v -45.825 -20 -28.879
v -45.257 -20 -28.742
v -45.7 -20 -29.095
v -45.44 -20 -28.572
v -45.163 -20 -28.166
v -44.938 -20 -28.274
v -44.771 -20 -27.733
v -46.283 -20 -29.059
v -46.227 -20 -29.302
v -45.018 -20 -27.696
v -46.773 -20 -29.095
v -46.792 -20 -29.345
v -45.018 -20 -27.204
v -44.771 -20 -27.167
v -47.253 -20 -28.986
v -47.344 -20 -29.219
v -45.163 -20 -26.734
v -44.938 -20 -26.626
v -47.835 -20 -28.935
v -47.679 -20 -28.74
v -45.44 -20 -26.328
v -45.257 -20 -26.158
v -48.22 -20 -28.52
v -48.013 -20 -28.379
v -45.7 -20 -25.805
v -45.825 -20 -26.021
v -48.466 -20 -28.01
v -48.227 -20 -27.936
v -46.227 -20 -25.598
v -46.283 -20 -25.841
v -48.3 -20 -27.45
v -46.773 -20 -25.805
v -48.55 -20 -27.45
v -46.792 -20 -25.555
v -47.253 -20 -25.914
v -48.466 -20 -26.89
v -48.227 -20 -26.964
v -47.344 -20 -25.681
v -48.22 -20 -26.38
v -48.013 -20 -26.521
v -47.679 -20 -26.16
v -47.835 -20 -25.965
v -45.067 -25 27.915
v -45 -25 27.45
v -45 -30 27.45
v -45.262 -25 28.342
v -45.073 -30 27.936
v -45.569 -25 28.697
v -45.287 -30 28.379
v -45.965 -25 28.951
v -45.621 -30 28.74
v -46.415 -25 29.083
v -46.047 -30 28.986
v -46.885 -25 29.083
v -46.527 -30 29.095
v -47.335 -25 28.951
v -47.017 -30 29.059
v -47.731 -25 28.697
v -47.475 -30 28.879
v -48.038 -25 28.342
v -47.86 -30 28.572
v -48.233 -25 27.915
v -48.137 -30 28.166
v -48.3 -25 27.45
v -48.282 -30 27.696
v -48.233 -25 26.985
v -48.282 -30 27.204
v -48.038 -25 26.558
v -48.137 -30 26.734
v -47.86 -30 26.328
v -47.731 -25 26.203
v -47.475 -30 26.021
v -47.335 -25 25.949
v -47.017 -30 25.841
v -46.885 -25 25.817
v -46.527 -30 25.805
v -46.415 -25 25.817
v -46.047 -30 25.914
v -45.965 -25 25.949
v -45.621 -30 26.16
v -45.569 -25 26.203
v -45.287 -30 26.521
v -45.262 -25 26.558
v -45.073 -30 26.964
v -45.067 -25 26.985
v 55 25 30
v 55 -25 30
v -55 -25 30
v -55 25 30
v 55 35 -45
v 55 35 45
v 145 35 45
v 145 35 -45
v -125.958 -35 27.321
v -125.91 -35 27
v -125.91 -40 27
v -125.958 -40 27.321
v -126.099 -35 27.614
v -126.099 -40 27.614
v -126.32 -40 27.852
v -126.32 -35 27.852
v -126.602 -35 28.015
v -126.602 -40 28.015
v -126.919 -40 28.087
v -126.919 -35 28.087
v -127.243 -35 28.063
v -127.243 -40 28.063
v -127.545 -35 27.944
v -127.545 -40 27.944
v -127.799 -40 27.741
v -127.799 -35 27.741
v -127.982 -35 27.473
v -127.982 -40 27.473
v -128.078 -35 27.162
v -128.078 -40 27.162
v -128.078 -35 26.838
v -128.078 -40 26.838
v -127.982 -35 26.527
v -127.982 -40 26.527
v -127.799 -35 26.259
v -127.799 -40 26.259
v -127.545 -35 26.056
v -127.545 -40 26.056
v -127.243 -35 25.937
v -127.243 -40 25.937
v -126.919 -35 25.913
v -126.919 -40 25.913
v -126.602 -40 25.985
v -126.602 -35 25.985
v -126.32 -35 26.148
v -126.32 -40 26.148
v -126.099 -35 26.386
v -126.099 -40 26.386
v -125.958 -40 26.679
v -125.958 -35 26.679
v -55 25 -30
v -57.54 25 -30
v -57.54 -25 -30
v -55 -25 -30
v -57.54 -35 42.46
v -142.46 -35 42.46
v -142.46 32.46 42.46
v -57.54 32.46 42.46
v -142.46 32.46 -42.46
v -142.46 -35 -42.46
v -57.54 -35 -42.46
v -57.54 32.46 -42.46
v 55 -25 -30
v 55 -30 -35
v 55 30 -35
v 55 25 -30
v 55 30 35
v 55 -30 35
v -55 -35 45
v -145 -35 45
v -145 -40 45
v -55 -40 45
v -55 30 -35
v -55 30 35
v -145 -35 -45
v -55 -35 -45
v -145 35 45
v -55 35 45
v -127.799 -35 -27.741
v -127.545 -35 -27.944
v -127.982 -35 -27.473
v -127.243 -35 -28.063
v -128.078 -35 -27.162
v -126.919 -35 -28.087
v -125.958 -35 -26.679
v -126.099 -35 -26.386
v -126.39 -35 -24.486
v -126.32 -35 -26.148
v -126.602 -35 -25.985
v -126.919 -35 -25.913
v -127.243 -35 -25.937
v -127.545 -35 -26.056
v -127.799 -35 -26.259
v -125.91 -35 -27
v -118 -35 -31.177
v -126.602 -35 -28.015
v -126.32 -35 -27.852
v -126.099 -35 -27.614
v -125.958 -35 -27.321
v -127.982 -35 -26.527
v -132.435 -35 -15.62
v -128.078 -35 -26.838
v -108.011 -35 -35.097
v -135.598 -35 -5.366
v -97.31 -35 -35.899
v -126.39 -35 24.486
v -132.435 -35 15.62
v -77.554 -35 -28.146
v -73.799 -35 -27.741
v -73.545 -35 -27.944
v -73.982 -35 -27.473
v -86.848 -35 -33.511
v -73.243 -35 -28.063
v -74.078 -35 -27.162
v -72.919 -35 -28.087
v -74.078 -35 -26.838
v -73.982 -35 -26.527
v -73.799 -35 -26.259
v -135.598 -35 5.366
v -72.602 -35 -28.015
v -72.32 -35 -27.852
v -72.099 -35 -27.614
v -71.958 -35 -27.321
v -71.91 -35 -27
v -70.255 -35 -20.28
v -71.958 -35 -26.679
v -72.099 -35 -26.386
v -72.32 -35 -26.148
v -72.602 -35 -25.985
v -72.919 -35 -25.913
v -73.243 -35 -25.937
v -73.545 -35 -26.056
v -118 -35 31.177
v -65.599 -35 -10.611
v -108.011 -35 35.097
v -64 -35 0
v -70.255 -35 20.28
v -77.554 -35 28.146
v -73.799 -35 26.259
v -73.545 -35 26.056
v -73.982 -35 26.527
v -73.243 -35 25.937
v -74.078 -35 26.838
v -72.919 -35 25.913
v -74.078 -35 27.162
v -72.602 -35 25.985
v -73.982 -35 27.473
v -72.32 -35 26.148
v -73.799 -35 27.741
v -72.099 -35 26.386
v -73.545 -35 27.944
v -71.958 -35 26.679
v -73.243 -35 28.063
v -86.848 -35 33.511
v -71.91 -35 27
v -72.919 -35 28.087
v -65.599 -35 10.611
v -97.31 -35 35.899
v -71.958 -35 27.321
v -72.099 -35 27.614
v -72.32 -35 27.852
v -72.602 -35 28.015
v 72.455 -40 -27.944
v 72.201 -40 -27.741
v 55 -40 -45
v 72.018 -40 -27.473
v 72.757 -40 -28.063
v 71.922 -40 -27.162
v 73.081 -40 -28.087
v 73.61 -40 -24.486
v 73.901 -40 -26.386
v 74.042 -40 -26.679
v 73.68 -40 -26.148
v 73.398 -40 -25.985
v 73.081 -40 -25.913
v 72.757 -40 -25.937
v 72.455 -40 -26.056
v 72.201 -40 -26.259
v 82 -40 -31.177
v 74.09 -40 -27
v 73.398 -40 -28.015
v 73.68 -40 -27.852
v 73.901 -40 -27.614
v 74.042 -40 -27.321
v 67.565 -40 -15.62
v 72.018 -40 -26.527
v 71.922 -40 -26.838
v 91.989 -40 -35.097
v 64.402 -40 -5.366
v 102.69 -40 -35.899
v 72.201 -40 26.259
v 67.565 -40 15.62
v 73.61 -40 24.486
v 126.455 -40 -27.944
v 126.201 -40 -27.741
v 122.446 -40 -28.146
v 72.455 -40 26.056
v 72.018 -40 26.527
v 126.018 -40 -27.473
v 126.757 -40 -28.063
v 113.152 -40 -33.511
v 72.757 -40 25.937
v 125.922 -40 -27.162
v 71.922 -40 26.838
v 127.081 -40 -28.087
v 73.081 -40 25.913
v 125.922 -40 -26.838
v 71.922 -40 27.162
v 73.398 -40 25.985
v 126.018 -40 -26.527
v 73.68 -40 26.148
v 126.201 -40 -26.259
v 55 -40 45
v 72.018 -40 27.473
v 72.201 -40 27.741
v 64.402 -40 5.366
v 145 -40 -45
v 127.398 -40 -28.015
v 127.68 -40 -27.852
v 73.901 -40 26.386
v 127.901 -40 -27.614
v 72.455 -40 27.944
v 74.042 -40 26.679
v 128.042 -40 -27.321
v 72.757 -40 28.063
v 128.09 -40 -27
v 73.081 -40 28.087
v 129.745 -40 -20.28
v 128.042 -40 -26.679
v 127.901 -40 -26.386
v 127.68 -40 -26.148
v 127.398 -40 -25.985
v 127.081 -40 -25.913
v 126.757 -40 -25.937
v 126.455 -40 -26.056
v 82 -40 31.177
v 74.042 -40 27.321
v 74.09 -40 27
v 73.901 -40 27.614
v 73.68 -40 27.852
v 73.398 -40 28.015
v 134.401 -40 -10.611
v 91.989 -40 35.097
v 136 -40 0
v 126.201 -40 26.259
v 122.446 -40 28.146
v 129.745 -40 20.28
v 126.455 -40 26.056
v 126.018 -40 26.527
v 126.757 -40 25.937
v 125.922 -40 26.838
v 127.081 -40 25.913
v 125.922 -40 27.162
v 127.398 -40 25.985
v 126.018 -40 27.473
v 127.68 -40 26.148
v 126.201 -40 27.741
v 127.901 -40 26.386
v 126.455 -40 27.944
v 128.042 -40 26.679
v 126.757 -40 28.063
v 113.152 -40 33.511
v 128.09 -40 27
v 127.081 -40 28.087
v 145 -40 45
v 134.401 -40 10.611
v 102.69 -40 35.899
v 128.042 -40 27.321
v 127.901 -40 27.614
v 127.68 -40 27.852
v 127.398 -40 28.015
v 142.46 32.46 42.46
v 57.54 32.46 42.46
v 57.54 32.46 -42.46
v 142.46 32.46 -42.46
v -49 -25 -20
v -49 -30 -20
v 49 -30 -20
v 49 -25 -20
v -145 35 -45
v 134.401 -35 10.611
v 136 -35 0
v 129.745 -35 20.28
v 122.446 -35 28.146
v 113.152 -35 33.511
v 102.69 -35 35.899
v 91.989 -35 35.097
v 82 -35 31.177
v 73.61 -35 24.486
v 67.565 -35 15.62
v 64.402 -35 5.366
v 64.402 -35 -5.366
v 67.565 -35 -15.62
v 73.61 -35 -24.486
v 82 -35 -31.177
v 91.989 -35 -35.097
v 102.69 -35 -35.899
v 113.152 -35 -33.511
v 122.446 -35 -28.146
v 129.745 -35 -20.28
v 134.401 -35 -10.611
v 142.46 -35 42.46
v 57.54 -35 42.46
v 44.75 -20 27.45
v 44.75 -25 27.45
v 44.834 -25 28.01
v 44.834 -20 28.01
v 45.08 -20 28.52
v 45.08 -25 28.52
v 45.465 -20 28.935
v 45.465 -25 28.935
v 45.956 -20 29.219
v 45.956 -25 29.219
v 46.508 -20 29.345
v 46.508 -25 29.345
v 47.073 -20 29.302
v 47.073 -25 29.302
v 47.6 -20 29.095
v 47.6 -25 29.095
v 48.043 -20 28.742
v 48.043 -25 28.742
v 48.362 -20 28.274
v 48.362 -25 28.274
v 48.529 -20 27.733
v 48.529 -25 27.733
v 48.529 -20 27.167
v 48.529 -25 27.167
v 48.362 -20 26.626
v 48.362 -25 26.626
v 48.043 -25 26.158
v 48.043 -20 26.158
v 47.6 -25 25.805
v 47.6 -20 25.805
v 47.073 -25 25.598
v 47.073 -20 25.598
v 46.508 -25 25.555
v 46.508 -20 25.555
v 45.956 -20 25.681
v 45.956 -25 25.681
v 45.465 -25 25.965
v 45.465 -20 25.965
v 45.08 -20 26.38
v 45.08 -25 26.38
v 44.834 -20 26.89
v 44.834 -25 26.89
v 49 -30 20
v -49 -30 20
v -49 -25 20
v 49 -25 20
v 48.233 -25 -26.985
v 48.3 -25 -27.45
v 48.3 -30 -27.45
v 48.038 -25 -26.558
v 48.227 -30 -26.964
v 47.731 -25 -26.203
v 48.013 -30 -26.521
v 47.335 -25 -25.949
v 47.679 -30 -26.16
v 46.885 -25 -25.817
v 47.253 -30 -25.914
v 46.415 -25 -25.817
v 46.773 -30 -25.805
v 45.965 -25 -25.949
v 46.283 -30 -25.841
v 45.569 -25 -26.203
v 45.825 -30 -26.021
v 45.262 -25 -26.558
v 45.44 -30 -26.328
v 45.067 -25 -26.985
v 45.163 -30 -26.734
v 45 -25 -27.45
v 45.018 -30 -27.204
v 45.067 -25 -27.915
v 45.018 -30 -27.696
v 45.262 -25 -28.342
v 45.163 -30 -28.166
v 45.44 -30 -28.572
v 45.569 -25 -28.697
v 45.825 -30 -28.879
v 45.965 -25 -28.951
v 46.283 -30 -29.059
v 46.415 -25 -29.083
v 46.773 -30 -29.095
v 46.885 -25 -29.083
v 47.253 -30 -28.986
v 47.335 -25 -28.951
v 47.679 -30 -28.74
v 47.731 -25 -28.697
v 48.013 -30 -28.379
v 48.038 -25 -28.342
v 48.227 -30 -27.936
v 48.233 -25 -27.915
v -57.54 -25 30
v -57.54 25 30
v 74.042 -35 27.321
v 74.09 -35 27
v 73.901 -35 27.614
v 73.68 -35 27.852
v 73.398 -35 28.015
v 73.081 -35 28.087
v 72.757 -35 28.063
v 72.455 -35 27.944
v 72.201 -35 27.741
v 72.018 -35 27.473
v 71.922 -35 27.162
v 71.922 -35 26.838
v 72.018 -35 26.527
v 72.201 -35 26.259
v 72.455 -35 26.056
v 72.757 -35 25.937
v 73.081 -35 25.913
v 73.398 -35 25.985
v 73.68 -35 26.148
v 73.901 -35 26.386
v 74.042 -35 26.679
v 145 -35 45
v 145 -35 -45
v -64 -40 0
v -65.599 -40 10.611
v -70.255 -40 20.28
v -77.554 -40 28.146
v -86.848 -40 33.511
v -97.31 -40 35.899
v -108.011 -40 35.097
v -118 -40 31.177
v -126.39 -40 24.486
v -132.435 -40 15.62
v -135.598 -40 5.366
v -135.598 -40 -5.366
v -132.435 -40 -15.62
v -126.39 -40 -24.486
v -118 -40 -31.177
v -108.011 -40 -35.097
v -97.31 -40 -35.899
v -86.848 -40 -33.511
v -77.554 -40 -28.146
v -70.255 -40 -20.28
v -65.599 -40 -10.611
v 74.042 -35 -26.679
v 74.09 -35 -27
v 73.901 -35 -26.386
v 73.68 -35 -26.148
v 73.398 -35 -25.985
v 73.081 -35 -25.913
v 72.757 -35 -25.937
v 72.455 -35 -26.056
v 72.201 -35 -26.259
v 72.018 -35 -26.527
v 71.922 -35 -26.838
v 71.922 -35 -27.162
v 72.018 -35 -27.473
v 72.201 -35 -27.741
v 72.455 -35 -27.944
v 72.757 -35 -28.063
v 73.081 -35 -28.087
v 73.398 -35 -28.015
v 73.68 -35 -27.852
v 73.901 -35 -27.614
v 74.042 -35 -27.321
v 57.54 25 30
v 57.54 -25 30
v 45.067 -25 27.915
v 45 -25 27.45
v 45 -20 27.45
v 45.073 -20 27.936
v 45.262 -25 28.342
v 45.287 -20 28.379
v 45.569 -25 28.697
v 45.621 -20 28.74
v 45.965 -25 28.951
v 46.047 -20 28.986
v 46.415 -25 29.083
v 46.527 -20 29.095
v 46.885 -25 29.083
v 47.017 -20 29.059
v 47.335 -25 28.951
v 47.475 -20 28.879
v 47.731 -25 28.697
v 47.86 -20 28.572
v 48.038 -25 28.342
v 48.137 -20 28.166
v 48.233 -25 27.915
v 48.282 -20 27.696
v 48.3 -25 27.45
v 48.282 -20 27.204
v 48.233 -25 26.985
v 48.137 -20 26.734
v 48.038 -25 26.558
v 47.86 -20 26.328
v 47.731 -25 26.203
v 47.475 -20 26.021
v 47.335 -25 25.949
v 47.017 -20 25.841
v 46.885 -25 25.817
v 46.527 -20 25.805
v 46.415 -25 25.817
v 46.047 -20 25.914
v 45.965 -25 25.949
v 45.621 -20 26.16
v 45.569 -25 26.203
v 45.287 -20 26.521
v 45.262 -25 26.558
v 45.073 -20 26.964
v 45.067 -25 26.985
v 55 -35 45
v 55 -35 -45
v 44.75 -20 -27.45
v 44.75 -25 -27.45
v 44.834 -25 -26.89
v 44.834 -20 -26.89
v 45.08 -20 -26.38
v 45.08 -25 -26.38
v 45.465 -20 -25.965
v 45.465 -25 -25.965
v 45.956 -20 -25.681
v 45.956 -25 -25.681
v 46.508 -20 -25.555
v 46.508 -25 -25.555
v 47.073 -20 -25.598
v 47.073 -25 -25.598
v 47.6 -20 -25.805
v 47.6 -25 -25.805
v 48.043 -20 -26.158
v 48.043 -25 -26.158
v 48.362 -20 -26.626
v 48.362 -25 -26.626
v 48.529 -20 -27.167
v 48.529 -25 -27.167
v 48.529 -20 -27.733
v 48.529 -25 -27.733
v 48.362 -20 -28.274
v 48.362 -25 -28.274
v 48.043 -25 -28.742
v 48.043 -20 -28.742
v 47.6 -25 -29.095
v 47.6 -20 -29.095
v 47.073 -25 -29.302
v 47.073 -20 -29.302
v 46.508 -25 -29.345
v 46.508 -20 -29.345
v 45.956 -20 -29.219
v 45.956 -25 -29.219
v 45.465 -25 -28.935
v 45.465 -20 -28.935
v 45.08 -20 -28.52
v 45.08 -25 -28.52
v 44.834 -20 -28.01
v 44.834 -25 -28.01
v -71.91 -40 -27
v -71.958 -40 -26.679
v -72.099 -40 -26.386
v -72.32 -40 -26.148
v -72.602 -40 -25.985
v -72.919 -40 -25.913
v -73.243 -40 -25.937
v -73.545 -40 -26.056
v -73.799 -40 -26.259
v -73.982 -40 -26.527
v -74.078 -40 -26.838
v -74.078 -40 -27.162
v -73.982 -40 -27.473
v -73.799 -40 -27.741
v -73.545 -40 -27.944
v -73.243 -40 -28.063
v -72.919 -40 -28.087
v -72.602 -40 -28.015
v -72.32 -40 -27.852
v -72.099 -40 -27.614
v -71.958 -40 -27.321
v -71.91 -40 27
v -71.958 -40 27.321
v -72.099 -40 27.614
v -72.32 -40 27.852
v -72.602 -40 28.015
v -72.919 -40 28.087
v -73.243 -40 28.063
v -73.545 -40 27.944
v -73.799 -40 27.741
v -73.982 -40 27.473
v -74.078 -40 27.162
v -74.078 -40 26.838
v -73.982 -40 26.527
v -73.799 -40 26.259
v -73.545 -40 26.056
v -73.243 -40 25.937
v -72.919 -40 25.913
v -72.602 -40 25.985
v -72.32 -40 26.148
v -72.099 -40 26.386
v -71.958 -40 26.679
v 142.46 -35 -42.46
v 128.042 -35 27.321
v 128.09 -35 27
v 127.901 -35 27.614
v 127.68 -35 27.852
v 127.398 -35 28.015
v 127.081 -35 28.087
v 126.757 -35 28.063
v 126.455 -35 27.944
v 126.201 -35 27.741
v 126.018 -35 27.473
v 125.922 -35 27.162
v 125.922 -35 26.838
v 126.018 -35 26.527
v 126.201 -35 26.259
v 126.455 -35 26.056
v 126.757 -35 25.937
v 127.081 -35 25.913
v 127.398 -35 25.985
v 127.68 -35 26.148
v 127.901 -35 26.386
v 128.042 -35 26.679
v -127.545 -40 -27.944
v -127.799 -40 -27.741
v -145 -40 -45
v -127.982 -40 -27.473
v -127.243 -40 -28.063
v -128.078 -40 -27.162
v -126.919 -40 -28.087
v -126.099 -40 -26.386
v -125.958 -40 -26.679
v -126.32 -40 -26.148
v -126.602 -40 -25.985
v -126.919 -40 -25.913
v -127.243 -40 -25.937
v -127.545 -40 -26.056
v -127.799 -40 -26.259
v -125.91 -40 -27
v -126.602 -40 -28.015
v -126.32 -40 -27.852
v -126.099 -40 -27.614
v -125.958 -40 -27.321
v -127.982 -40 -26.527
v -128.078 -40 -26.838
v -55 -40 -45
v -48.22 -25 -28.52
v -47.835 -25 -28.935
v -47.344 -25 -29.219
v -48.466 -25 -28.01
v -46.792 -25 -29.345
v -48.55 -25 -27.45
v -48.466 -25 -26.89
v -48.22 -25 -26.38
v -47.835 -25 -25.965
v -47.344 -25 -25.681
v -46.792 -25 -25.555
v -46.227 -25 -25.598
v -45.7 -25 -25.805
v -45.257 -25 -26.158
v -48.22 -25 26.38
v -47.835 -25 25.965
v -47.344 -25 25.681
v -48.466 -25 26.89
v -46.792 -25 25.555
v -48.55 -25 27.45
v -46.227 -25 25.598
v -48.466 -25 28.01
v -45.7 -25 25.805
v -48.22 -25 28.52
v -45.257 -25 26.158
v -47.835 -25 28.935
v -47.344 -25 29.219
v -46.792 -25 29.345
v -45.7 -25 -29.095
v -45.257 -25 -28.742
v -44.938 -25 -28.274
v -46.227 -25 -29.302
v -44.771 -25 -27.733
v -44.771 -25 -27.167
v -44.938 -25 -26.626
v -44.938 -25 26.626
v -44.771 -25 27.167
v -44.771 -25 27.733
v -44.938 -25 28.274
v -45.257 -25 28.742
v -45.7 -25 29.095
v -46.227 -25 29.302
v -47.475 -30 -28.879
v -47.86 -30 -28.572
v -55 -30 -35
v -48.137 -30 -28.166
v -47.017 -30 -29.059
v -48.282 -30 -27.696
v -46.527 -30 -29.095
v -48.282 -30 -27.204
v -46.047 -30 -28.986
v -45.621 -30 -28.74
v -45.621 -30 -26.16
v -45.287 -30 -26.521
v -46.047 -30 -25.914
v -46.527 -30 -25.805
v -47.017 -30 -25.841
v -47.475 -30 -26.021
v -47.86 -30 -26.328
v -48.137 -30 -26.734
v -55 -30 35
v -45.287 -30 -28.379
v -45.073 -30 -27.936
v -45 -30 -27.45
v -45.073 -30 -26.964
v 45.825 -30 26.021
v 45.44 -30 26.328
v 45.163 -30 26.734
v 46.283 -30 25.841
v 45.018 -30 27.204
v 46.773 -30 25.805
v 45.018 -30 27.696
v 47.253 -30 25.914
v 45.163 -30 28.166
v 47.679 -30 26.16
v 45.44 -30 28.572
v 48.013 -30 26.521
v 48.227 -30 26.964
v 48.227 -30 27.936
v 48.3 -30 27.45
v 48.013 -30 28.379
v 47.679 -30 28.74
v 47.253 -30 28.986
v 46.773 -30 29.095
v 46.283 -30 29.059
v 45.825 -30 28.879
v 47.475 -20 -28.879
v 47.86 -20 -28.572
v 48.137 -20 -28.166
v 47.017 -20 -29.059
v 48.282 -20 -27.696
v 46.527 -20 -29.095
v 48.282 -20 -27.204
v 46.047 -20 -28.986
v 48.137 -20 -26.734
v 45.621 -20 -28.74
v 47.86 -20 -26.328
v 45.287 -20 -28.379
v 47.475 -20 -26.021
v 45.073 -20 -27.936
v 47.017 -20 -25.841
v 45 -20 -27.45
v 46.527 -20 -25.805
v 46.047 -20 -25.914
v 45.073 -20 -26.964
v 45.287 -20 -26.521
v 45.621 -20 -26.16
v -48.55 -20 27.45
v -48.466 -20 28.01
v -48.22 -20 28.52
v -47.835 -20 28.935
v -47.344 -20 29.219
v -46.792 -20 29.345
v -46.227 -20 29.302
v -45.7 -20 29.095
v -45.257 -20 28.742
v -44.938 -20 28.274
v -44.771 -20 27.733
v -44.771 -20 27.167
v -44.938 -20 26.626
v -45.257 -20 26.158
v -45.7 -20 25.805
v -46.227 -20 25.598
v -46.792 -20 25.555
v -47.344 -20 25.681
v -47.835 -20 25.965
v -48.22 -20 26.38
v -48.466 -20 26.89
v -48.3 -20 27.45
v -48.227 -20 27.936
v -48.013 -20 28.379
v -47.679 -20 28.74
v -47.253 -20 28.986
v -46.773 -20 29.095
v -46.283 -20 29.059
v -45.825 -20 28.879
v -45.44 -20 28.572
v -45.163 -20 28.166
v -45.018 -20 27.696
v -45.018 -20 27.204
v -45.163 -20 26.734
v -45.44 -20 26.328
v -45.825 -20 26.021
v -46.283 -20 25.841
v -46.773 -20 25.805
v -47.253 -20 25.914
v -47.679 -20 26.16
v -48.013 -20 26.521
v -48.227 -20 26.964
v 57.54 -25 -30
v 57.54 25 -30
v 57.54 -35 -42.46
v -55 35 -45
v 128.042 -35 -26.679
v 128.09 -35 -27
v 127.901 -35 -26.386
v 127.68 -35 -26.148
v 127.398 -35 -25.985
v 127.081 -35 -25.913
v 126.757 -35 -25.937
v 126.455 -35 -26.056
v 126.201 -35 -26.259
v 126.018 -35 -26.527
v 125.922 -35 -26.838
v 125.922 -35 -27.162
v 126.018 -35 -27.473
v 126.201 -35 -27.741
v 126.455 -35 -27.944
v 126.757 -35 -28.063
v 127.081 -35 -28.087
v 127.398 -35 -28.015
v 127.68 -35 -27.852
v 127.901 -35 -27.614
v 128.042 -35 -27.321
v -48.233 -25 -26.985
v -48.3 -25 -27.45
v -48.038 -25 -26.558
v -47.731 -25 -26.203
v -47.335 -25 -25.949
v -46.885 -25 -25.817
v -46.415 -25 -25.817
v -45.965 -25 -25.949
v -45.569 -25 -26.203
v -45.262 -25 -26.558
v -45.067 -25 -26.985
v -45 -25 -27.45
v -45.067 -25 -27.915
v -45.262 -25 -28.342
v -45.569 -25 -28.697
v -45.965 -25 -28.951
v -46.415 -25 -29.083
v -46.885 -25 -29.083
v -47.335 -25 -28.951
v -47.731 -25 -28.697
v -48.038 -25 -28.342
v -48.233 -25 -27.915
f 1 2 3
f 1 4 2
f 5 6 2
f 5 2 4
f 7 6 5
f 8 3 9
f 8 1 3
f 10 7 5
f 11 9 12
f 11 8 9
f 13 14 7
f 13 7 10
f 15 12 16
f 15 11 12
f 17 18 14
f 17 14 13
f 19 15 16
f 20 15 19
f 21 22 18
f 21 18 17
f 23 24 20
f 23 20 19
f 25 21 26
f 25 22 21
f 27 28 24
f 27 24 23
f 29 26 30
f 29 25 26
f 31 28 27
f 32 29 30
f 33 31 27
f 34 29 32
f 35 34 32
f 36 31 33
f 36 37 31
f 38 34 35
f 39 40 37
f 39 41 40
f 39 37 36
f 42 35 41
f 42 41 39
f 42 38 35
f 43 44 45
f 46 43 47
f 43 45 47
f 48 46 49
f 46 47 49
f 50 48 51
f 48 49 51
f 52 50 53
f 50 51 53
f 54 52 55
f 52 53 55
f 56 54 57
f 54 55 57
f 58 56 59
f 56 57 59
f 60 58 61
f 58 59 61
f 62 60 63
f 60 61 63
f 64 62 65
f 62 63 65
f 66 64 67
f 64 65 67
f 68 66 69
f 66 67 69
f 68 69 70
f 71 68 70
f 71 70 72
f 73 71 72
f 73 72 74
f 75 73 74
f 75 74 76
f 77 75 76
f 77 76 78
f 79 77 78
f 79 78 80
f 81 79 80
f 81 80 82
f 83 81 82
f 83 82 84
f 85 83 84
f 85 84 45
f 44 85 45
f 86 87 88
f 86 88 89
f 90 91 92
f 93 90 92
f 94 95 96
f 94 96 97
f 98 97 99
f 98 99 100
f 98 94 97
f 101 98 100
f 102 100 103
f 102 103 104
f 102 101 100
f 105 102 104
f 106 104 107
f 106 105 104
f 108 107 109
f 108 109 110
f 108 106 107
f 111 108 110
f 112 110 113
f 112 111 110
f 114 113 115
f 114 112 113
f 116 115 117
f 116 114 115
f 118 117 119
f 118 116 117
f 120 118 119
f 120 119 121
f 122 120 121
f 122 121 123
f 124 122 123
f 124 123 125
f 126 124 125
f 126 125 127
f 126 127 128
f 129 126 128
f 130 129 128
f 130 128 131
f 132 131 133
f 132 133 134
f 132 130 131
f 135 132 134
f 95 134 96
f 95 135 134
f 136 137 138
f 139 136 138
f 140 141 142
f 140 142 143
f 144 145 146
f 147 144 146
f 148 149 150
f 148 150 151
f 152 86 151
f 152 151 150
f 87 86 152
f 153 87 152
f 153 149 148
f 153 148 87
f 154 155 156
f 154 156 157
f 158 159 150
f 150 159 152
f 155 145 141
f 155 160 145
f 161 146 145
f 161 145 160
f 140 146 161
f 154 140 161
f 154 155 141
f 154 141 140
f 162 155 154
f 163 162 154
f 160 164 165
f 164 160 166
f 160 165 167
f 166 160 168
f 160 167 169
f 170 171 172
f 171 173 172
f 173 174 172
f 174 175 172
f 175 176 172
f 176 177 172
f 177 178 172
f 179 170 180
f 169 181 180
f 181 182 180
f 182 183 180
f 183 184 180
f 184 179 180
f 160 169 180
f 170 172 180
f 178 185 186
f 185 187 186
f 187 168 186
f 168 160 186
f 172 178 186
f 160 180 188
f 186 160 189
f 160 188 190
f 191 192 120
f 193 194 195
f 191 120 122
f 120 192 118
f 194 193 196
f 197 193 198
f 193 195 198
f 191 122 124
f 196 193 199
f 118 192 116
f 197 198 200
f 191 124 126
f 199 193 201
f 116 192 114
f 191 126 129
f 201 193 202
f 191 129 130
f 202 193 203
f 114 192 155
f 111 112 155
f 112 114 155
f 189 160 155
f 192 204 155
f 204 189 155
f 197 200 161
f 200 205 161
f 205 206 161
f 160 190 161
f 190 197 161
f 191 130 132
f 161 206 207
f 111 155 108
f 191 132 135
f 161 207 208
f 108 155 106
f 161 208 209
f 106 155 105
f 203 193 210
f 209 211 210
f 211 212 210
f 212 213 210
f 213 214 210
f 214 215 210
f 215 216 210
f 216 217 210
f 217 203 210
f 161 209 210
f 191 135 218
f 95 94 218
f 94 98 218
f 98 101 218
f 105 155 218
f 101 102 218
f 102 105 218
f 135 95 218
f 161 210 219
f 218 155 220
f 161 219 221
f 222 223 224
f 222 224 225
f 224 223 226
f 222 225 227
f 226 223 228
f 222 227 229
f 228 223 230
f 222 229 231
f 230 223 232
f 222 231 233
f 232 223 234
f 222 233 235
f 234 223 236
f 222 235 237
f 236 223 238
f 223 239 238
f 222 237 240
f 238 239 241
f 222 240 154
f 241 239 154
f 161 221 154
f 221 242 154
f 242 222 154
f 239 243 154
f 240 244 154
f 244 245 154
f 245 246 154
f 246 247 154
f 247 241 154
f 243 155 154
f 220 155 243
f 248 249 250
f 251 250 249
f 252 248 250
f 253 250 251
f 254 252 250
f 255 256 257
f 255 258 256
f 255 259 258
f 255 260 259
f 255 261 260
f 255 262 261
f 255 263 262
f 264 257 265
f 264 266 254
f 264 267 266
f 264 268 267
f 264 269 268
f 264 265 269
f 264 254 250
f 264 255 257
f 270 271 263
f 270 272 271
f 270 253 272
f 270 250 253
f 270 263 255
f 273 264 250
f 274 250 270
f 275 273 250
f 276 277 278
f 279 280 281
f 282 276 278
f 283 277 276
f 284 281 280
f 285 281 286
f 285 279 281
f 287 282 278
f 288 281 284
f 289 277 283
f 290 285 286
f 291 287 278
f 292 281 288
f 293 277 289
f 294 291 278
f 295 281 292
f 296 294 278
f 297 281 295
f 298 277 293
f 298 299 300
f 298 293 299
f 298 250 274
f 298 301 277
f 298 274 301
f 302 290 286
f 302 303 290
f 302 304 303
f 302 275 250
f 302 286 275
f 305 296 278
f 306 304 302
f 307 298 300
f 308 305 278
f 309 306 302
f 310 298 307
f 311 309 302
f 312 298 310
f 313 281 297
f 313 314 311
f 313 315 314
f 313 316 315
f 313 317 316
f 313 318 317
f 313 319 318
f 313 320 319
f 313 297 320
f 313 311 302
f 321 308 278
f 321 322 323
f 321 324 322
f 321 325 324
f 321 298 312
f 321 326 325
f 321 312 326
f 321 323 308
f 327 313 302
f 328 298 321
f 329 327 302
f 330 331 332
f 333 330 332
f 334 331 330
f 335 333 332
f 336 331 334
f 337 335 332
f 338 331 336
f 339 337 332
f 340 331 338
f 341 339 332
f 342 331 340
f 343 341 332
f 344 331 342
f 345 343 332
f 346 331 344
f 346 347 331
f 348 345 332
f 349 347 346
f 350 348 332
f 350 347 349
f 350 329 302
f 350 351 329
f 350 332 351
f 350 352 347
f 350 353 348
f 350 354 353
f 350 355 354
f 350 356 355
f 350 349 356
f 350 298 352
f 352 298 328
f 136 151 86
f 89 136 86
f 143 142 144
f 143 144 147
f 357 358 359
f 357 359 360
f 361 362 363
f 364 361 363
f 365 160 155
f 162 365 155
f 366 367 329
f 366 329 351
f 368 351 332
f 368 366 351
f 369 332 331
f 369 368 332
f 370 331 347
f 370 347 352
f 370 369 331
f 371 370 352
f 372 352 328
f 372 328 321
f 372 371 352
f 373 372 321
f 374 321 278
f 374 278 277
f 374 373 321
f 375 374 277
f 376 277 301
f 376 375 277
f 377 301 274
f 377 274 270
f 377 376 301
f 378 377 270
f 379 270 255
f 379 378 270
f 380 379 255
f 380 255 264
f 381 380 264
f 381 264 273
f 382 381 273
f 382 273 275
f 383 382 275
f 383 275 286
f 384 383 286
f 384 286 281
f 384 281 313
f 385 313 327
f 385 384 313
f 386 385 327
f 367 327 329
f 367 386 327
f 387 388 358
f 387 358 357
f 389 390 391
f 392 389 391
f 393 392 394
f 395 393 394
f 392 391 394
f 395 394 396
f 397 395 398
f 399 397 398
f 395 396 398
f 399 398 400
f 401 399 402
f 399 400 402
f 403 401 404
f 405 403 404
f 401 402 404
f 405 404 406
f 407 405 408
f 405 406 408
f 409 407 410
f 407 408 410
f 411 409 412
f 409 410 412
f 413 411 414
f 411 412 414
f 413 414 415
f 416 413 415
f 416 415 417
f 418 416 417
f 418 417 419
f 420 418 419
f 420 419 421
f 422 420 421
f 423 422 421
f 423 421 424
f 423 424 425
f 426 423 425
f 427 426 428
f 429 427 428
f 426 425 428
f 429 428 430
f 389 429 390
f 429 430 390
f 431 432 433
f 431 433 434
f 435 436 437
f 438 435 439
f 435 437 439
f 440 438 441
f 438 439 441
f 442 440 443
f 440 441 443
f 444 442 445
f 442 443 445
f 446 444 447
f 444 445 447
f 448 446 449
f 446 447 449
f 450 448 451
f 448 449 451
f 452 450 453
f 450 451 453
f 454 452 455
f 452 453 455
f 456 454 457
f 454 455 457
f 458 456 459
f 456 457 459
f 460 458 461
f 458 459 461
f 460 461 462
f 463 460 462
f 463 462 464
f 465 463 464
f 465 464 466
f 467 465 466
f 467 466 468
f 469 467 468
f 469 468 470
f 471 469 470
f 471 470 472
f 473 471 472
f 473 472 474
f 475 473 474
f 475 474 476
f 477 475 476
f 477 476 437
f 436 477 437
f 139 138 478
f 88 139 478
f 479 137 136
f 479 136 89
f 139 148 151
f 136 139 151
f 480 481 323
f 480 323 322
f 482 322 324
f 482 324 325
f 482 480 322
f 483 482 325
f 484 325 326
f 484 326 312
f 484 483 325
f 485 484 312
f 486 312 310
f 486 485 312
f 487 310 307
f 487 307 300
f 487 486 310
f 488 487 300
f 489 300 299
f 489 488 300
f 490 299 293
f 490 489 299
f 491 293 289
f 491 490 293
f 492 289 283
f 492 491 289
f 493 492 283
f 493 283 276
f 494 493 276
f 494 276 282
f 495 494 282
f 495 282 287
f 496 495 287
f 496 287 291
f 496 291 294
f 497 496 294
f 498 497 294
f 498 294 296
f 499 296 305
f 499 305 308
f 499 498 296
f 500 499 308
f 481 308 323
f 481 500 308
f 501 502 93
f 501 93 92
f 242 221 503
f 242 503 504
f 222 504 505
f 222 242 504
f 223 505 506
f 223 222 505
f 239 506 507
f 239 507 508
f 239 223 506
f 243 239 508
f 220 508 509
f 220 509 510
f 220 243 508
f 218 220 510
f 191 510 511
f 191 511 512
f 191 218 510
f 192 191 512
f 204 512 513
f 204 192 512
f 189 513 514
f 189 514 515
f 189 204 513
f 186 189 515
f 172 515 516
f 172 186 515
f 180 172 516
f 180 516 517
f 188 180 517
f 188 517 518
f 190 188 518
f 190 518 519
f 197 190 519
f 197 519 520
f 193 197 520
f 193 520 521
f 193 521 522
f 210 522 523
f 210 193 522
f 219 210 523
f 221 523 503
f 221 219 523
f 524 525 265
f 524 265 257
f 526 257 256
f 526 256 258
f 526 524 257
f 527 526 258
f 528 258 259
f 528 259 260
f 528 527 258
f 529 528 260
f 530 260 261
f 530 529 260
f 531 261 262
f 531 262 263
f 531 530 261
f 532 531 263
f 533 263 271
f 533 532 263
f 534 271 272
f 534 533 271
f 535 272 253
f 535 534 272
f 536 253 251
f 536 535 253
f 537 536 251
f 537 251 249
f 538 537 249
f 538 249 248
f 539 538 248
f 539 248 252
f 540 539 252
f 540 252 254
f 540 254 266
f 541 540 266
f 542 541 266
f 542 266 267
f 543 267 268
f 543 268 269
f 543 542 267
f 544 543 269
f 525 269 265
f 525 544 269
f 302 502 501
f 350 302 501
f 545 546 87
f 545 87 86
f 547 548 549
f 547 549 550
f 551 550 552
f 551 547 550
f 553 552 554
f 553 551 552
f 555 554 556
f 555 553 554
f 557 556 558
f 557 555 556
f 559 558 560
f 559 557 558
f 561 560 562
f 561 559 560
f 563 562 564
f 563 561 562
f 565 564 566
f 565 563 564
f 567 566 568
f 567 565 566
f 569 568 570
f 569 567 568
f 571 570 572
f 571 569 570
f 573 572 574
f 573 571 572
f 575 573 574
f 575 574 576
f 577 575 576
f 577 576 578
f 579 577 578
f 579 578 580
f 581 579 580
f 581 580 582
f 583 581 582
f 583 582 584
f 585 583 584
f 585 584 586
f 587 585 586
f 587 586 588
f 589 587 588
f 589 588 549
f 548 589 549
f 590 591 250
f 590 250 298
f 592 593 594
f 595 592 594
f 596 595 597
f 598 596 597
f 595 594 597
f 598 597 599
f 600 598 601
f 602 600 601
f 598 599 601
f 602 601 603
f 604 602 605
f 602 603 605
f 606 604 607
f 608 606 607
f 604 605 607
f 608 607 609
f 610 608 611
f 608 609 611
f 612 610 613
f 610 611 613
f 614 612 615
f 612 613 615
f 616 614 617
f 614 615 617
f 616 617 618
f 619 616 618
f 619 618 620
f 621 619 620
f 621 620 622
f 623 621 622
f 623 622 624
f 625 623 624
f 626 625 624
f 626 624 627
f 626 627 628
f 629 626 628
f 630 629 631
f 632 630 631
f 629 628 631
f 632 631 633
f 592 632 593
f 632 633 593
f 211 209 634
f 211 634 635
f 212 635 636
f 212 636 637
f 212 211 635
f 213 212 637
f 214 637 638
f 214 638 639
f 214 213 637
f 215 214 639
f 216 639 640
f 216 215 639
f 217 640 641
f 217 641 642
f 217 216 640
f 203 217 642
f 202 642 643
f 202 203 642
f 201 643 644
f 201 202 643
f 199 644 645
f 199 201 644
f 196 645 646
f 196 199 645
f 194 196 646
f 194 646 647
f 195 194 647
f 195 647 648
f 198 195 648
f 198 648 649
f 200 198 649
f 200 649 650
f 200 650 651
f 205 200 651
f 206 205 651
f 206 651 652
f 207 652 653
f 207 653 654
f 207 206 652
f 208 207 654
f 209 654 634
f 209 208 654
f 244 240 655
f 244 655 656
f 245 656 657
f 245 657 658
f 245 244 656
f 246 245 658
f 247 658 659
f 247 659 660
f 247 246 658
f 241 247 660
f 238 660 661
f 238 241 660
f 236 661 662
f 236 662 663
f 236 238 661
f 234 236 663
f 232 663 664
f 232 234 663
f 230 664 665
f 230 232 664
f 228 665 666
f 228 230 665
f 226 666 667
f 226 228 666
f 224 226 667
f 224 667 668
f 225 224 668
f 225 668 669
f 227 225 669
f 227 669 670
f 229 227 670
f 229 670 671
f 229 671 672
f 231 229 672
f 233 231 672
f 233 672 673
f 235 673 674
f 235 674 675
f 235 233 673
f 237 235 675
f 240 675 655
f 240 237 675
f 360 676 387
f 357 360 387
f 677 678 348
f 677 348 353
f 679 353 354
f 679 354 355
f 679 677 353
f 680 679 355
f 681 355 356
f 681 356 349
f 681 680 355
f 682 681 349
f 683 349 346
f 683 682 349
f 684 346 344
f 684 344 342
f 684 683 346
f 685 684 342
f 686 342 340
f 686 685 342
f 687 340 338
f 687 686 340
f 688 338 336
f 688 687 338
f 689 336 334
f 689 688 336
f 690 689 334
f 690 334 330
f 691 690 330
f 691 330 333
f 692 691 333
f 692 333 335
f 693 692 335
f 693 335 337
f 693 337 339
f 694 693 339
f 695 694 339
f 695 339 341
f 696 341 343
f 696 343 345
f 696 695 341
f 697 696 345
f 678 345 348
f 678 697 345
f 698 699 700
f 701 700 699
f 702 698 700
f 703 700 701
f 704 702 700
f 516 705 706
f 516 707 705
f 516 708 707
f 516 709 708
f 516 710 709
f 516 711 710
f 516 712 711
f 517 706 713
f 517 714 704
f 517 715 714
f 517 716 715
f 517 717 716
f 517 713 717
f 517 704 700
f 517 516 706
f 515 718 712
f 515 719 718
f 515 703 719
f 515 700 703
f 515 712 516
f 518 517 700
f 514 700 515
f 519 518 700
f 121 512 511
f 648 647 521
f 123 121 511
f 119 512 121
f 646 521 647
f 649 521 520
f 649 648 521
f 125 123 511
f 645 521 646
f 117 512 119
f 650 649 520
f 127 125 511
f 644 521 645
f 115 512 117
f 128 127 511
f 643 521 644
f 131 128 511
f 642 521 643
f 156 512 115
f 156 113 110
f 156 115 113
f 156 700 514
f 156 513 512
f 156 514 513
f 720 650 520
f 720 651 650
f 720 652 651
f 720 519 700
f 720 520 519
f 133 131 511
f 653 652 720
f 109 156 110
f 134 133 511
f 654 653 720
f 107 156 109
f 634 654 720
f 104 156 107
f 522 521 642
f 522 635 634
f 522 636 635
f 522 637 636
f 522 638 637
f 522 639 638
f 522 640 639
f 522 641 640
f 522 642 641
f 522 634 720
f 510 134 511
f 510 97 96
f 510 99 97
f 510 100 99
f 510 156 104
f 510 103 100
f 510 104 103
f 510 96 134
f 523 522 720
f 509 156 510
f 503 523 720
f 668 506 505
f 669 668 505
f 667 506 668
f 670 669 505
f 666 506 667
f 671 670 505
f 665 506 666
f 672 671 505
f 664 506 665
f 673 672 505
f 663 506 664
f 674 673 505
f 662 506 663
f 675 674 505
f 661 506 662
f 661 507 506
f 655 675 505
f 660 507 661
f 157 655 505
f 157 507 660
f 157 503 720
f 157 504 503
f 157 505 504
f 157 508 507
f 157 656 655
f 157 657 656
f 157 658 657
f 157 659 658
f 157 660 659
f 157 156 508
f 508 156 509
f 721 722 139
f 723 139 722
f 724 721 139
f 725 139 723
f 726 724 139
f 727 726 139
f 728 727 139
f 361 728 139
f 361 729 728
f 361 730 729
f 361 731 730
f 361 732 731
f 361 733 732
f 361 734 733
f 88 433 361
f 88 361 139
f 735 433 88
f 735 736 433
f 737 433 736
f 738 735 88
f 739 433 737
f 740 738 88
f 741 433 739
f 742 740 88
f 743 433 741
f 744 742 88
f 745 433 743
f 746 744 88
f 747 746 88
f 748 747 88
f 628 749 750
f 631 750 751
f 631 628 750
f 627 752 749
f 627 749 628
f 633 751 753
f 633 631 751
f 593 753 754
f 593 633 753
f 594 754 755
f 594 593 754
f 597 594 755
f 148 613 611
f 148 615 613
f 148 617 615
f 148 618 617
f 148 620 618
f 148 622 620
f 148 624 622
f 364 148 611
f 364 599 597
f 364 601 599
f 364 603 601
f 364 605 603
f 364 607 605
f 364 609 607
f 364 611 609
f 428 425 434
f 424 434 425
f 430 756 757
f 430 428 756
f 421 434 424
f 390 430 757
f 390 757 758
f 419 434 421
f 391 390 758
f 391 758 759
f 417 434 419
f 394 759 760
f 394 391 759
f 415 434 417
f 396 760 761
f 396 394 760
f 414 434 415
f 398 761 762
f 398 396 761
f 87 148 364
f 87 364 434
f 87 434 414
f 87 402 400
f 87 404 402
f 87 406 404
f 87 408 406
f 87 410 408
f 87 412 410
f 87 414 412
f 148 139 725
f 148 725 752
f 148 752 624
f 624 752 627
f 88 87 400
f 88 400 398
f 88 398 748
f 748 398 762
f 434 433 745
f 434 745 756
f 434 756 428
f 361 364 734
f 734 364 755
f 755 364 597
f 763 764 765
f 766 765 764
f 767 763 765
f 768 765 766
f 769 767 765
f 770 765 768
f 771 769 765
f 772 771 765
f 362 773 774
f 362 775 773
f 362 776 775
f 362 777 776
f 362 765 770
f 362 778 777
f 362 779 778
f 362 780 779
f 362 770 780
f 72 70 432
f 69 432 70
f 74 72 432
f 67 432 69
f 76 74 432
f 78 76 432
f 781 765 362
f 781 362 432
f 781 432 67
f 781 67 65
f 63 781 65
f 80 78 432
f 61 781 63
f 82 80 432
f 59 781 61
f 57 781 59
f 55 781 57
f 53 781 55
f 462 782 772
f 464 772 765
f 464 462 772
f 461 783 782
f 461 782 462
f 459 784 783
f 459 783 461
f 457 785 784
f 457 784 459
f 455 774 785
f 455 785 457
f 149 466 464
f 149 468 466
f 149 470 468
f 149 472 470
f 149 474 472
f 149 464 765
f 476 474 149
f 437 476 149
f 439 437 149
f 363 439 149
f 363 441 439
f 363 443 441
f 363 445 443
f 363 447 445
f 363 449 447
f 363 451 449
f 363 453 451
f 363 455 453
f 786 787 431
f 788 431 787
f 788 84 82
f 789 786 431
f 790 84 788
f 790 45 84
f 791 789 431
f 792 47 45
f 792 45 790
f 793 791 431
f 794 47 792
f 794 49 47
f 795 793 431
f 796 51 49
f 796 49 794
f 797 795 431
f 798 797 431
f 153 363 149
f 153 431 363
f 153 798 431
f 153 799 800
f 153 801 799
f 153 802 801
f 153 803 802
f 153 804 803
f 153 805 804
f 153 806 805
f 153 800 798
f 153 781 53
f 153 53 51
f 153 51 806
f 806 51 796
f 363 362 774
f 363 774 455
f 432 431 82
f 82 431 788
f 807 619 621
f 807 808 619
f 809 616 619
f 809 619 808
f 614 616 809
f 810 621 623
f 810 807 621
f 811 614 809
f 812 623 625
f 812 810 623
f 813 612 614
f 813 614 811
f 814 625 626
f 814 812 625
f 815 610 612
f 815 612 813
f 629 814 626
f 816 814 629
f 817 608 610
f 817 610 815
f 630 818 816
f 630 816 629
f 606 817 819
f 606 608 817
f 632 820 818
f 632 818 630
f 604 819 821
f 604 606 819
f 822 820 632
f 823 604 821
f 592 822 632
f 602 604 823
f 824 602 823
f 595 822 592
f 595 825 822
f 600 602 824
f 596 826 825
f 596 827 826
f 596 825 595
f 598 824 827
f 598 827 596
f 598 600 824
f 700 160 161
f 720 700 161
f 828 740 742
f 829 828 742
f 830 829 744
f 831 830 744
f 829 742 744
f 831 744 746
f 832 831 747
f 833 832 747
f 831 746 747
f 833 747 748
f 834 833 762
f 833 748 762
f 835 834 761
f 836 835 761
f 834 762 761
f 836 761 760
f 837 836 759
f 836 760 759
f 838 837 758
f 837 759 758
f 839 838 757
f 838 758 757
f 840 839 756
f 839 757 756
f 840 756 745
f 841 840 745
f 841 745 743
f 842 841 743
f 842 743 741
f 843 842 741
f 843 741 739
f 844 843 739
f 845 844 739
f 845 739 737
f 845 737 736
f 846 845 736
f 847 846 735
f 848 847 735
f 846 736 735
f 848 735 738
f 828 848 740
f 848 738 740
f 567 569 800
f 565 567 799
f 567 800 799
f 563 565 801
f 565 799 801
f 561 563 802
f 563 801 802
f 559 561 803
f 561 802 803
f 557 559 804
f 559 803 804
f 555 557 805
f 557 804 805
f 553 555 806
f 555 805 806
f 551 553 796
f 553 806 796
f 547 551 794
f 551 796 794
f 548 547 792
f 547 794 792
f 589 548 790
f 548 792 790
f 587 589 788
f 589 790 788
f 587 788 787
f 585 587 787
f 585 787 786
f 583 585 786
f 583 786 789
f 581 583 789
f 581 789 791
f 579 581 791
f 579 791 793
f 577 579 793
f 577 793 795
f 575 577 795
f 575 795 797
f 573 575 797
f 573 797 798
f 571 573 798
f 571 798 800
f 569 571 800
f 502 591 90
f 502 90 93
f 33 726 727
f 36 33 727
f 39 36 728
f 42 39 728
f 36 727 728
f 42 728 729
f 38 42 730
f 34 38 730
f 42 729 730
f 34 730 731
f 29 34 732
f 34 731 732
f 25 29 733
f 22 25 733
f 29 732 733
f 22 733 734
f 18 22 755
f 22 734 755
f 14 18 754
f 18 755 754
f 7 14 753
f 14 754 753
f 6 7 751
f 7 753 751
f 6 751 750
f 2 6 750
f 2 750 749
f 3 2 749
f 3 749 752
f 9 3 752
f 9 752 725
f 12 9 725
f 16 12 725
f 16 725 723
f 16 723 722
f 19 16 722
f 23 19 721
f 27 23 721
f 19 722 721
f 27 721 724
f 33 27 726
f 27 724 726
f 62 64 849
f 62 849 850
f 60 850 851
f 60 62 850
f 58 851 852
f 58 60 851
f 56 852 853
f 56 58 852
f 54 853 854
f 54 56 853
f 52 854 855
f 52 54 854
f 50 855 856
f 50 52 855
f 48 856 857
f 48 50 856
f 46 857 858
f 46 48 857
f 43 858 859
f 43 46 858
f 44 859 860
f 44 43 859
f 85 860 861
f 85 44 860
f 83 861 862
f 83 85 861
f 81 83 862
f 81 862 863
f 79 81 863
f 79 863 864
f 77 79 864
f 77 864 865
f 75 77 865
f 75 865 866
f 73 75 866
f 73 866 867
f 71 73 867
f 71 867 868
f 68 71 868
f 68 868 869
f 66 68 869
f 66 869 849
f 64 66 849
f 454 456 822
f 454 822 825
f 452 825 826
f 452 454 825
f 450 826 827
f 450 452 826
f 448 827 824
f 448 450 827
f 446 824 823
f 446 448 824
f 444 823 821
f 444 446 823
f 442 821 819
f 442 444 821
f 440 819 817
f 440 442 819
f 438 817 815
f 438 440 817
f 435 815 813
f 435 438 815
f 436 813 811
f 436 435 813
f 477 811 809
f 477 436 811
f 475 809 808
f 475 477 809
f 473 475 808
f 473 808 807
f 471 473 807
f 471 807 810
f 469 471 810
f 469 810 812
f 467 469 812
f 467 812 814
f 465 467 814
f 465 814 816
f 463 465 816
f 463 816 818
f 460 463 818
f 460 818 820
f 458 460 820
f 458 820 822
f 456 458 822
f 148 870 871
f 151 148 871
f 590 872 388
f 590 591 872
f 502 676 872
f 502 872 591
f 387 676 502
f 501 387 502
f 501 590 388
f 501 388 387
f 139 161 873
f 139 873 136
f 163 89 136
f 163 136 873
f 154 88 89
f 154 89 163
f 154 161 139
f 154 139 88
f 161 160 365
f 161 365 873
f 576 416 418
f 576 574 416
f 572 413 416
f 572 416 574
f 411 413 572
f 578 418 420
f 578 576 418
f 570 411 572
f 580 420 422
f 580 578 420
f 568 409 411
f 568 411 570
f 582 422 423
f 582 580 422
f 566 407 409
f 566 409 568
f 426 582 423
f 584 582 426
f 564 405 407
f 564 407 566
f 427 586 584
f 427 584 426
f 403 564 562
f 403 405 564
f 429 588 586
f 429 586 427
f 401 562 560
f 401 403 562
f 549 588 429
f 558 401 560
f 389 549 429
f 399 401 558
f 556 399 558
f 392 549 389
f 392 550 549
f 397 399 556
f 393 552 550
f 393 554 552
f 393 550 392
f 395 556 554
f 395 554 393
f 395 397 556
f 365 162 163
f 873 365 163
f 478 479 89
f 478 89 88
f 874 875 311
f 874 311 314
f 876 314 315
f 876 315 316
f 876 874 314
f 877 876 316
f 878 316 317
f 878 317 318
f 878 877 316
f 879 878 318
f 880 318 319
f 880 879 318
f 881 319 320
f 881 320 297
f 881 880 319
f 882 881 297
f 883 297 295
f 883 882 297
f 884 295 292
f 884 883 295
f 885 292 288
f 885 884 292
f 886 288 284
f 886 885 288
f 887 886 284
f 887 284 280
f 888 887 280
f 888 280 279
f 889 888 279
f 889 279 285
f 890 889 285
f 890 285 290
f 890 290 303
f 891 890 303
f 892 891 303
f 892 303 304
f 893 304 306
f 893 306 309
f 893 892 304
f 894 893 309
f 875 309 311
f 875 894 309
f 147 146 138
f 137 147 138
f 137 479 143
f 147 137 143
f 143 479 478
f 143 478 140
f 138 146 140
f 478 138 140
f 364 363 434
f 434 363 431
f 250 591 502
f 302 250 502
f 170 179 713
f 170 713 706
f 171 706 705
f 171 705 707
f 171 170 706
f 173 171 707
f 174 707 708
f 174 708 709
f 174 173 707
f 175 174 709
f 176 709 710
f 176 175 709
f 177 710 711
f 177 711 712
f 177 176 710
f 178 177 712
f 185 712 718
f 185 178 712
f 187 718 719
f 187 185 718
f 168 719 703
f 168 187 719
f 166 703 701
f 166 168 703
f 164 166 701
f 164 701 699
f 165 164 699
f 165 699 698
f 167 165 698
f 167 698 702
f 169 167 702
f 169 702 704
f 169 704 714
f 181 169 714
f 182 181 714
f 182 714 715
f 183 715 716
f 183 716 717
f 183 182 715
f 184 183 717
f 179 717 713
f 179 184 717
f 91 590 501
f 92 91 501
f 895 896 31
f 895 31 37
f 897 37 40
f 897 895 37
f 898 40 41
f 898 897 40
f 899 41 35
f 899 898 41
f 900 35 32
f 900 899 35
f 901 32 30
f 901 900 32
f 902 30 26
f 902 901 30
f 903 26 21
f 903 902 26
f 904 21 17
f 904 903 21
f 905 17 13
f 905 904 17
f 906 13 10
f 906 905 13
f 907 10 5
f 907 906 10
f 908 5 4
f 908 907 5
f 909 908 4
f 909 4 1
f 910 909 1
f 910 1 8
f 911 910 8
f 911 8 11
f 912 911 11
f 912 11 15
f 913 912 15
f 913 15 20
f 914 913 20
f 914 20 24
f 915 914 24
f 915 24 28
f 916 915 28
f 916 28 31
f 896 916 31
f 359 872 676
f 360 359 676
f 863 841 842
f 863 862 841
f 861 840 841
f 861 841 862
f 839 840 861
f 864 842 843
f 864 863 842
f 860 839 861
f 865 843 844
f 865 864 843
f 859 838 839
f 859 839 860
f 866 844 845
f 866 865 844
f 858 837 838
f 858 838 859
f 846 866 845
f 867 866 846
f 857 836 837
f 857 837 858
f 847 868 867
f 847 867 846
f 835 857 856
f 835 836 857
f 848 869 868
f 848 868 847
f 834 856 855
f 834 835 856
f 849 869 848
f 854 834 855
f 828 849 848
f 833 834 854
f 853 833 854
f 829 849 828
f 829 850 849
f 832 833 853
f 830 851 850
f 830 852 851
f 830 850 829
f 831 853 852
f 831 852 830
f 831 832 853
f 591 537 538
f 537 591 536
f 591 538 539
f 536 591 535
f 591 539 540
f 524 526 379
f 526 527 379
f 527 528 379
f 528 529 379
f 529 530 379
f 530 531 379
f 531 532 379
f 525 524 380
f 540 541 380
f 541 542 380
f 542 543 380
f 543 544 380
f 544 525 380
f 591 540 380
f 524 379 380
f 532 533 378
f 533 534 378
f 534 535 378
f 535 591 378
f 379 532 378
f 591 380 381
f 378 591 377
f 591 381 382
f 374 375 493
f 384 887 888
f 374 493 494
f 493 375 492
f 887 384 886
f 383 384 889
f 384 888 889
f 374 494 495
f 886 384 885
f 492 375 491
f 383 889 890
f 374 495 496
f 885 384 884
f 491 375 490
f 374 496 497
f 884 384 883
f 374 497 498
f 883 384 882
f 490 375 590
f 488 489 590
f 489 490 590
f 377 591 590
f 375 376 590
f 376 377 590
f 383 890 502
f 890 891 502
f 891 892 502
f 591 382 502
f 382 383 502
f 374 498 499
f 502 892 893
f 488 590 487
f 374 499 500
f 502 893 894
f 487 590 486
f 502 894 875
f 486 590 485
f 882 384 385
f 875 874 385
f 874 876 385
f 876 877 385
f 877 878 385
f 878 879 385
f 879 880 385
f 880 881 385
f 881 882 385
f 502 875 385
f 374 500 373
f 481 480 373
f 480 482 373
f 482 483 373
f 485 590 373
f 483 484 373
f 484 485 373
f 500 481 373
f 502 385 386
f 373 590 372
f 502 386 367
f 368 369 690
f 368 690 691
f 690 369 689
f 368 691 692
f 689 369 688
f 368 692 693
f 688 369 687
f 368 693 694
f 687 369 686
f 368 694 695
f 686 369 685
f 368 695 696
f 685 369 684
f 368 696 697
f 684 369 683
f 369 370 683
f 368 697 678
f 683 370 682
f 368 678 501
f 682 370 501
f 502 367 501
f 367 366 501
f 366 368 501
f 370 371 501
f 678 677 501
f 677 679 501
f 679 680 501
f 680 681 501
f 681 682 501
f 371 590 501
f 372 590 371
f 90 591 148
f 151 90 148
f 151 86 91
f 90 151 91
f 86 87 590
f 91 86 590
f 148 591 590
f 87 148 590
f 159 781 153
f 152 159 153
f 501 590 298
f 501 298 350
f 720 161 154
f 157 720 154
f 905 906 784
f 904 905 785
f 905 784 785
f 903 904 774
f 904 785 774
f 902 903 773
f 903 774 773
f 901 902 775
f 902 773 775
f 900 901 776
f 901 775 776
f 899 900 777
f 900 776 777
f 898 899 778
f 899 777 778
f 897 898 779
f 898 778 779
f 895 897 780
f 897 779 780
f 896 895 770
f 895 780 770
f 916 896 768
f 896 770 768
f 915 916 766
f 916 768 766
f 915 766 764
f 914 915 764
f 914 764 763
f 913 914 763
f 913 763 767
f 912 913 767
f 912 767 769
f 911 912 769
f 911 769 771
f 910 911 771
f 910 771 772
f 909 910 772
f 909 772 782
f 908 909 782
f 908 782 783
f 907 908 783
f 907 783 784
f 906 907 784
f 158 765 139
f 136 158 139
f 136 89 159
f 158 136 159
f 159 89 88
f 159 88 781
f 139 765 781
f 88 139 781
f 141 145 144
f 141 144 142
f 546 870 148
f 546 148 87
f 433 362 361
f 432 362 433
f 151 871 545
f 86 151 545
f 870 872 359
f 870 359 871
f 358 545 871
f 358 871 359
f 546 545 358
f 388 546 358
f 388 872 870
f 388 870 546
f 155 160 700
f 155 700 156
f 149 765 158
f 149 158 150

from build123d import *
from build123d import SkipClean  # not in build123d's __all__

# Parameters (mm, degrees)
F1_W      = 110
F1_H      = 70
F2_DEPTH  = 60
F4_W      = 90
F4_H      = 90
F4_R      = 1.09
F4_R_2    = 36
F5_DEPTH  = 5
F6_W      = 90
F6_H      = 90
F7_DEPTH  = 70
F8_T      = -2.54
F8_2_T    = -2.54
F9_W      = 50
F9_H      = 60
F10_DEPTH = 110
F11_W     = 50
F11_H     = 60
F12_DEPTH = 25.4
F13_W     = 50
F13_H     = 60
F14_DEPTH = 25.4
F15_W     = 98
F15_H     = 40
F15_R     = 1.65
F16_DEPTH = 25.4
F17_R     = 1.9
F17_R_2   = 1.65
F18_DEPTH = 5


# Not quite as in the source:
# - a feature names something its author has since deleted; it is built from what else it names


with BuildPart() as f2:
    # F1 (on offset) → F2 (new body)
    with BuildSketch(Plane.XZ.offset(30)):
        Rectangle(F1_W, F1_H)
    extrude(amount=-F2_DEPTH)

    # F9 (on face) → F10 (cut, through all)
    with BuildSketch(Plane.YZ.offset(55)):
        Rectangle(F9_W, F9_H)
    extrude(amount=-F10_DEPTH, mode=Mode.SUBTRACT)

    # F15 (on offset) → F16 (cut)
    with BuildSketch(Plane.XZ.offset(30)):
        Rectangle(F15_W, F15_H)
        with Locations((46.65, 27.45)):
            Circle(F15_R)
        with Locations((-46.65, 27.45)):
            Circle(F15_R)
        with Locations((-46.65, -27.45)):
            Circle(F15_R)
        with Locations((46.65, -27.45)):
            Circle(F15_R)
    extrude(amount=-F16_DEPTH, mode=Mode.SUBTRACT)

    # F17 (on face) → F18 (join)
    with BuildSketch(Plane(origin=(0, -25, 0), x_dir=(-1, 0, 0), z_dir=(0, 1, 0))):
        with Locations((-46.65, 27.45)):
            Circle(F17_R)
        with Locations((-46.65, 27.45)):
            Circle(F17_R_2, mode=Mode.SUBTRACT)
        with Locations((46.65, 27.45)):
            Circle(F17_R)
        with Locations((46.65, 27.45)):
            Circle(F17_R_2, mode=Mode.SUBTRACT)
        with Locations((46.65, -27.45)):
            Circle(F17_R)
        with Locations((46.65, -27.45)):
            Circle(F17_R_2, mode=Mode.SUBTRACT)
        with Locations((-46.65, -27.45)):
            Circle(F17_R)
        with Locations((-46.65, -27.45)):
            Circle(F17_R_2, mode=Mode.SUBTRACT)
    with SkipClean():  # cleaning this boolean's faces spoils the solid; the shape is the same uncleaned
        extrude(amount=F18_DEPTH)


with BuildPart() as f5:
    # F4 (on offset) → F5 (new body)
    with BuildSketch(Plane.XZ.offset(35)):
        with Locations((-100, 0)):
            Rectangle(F4_W, F4_H)
        with Locations((-127, -27)):
            Circle(F4_R, mode=Mode.SUBTRACT)
        with Locations((-73, -27)):
            Circle(F4_R, mode=Mode.SUBTRACT)
        with Locations((-100, 0)):
            Circle(F4_R_2, mode=Mode.SUBTRACT)
        with Locations((-127, 27)):
            Circle(F4_R, mode=Mode.SUBTRACT)
        with Locations((-73, 27)):
            Circle(F4_R, mode=Mode.SUBTRACT)
    extrude(amount=F5_DEPTH)


with BuildPart() as f5b:
    # F4 (on offset) → F5, piece 2 (new body)
    with BuildSketch(Plane.XZ.offset(35)):
        with Locations((100, 0)):
            Rectangle(F4_W, F4_H)
        with Locations((73, -27)):
            Circle(F4_R, mode=Mode.SUBTRACT)
        with Locations((127, -27)):
            Circle(F4_R, mode=Mode.SUBTRACT)
        with Locations((100, 0)):
            Circle(F4_R_2, mode=Mode.SUBTRACT)
        with Locations((73, 27)):
            Circle(F4_R, mode=Mode.SUBTRACT)
        with Locations((127, 27)):
            Circle(F4_R, mode=Mode.SUBTRACT)
    extrude(amount=F5_DEPTH)


with BuildPart() as f7:
    # F6 (on offset) → F7 (new body)
    with BuildSketch(Plane.XZ.offset(35)):
        with Locations((-100, 0)):
            Rectangle(F6_W, F6_H)
    extrude(amount=-F7_DEPTH)

    # F8
    f8_openings = [f7.faces().sort_by_distance(p)[0] for p in [
        (-100, -35, 0),
    ]]
    offset(amount=F8_T, openings=f8_openings)

    # F13 (on face) → F14 (cut)
    with BuildSketch(Plane(origin=(-57.54, 0, 0), x_dir=(0, -1, 0), z_dir=(-1, 0, 0))):
        Rectangle(F13_W, F13_H)
    extrude(amount=-F14_DEPTH, mode=Mode.SUBTRACT)


with BuildPart() as f7b:
    # F6 (on offset) → F7, piece 2 (new body)
    with BuildSketch(Plane.XZ.offset(35)):
        with Locations((100, 0)):
            Rectangle(F6_W, F6_H)
    extrude(amount=-F7_DEPTH)

    # F8#2
    f8_2_openings = [f7b.faces().sort_by_distance(p)[0] for p in [
        (100, -35, 0),
    ]]
    offset(amount=F8_2_T, openings=f8_2_openings)

    # F11 (on face) → F12 (cut)
    with BuildSketch(Plane.YZ.offset(57.54)):
        Rectangle(F11_W, F11_H)
    extrude(amount=-F12_DEPTH, mode=Mode.SUBTRACT)


solid = Compound([f2.part, f5.part, f5b.part, f7.part, f7b.part])
